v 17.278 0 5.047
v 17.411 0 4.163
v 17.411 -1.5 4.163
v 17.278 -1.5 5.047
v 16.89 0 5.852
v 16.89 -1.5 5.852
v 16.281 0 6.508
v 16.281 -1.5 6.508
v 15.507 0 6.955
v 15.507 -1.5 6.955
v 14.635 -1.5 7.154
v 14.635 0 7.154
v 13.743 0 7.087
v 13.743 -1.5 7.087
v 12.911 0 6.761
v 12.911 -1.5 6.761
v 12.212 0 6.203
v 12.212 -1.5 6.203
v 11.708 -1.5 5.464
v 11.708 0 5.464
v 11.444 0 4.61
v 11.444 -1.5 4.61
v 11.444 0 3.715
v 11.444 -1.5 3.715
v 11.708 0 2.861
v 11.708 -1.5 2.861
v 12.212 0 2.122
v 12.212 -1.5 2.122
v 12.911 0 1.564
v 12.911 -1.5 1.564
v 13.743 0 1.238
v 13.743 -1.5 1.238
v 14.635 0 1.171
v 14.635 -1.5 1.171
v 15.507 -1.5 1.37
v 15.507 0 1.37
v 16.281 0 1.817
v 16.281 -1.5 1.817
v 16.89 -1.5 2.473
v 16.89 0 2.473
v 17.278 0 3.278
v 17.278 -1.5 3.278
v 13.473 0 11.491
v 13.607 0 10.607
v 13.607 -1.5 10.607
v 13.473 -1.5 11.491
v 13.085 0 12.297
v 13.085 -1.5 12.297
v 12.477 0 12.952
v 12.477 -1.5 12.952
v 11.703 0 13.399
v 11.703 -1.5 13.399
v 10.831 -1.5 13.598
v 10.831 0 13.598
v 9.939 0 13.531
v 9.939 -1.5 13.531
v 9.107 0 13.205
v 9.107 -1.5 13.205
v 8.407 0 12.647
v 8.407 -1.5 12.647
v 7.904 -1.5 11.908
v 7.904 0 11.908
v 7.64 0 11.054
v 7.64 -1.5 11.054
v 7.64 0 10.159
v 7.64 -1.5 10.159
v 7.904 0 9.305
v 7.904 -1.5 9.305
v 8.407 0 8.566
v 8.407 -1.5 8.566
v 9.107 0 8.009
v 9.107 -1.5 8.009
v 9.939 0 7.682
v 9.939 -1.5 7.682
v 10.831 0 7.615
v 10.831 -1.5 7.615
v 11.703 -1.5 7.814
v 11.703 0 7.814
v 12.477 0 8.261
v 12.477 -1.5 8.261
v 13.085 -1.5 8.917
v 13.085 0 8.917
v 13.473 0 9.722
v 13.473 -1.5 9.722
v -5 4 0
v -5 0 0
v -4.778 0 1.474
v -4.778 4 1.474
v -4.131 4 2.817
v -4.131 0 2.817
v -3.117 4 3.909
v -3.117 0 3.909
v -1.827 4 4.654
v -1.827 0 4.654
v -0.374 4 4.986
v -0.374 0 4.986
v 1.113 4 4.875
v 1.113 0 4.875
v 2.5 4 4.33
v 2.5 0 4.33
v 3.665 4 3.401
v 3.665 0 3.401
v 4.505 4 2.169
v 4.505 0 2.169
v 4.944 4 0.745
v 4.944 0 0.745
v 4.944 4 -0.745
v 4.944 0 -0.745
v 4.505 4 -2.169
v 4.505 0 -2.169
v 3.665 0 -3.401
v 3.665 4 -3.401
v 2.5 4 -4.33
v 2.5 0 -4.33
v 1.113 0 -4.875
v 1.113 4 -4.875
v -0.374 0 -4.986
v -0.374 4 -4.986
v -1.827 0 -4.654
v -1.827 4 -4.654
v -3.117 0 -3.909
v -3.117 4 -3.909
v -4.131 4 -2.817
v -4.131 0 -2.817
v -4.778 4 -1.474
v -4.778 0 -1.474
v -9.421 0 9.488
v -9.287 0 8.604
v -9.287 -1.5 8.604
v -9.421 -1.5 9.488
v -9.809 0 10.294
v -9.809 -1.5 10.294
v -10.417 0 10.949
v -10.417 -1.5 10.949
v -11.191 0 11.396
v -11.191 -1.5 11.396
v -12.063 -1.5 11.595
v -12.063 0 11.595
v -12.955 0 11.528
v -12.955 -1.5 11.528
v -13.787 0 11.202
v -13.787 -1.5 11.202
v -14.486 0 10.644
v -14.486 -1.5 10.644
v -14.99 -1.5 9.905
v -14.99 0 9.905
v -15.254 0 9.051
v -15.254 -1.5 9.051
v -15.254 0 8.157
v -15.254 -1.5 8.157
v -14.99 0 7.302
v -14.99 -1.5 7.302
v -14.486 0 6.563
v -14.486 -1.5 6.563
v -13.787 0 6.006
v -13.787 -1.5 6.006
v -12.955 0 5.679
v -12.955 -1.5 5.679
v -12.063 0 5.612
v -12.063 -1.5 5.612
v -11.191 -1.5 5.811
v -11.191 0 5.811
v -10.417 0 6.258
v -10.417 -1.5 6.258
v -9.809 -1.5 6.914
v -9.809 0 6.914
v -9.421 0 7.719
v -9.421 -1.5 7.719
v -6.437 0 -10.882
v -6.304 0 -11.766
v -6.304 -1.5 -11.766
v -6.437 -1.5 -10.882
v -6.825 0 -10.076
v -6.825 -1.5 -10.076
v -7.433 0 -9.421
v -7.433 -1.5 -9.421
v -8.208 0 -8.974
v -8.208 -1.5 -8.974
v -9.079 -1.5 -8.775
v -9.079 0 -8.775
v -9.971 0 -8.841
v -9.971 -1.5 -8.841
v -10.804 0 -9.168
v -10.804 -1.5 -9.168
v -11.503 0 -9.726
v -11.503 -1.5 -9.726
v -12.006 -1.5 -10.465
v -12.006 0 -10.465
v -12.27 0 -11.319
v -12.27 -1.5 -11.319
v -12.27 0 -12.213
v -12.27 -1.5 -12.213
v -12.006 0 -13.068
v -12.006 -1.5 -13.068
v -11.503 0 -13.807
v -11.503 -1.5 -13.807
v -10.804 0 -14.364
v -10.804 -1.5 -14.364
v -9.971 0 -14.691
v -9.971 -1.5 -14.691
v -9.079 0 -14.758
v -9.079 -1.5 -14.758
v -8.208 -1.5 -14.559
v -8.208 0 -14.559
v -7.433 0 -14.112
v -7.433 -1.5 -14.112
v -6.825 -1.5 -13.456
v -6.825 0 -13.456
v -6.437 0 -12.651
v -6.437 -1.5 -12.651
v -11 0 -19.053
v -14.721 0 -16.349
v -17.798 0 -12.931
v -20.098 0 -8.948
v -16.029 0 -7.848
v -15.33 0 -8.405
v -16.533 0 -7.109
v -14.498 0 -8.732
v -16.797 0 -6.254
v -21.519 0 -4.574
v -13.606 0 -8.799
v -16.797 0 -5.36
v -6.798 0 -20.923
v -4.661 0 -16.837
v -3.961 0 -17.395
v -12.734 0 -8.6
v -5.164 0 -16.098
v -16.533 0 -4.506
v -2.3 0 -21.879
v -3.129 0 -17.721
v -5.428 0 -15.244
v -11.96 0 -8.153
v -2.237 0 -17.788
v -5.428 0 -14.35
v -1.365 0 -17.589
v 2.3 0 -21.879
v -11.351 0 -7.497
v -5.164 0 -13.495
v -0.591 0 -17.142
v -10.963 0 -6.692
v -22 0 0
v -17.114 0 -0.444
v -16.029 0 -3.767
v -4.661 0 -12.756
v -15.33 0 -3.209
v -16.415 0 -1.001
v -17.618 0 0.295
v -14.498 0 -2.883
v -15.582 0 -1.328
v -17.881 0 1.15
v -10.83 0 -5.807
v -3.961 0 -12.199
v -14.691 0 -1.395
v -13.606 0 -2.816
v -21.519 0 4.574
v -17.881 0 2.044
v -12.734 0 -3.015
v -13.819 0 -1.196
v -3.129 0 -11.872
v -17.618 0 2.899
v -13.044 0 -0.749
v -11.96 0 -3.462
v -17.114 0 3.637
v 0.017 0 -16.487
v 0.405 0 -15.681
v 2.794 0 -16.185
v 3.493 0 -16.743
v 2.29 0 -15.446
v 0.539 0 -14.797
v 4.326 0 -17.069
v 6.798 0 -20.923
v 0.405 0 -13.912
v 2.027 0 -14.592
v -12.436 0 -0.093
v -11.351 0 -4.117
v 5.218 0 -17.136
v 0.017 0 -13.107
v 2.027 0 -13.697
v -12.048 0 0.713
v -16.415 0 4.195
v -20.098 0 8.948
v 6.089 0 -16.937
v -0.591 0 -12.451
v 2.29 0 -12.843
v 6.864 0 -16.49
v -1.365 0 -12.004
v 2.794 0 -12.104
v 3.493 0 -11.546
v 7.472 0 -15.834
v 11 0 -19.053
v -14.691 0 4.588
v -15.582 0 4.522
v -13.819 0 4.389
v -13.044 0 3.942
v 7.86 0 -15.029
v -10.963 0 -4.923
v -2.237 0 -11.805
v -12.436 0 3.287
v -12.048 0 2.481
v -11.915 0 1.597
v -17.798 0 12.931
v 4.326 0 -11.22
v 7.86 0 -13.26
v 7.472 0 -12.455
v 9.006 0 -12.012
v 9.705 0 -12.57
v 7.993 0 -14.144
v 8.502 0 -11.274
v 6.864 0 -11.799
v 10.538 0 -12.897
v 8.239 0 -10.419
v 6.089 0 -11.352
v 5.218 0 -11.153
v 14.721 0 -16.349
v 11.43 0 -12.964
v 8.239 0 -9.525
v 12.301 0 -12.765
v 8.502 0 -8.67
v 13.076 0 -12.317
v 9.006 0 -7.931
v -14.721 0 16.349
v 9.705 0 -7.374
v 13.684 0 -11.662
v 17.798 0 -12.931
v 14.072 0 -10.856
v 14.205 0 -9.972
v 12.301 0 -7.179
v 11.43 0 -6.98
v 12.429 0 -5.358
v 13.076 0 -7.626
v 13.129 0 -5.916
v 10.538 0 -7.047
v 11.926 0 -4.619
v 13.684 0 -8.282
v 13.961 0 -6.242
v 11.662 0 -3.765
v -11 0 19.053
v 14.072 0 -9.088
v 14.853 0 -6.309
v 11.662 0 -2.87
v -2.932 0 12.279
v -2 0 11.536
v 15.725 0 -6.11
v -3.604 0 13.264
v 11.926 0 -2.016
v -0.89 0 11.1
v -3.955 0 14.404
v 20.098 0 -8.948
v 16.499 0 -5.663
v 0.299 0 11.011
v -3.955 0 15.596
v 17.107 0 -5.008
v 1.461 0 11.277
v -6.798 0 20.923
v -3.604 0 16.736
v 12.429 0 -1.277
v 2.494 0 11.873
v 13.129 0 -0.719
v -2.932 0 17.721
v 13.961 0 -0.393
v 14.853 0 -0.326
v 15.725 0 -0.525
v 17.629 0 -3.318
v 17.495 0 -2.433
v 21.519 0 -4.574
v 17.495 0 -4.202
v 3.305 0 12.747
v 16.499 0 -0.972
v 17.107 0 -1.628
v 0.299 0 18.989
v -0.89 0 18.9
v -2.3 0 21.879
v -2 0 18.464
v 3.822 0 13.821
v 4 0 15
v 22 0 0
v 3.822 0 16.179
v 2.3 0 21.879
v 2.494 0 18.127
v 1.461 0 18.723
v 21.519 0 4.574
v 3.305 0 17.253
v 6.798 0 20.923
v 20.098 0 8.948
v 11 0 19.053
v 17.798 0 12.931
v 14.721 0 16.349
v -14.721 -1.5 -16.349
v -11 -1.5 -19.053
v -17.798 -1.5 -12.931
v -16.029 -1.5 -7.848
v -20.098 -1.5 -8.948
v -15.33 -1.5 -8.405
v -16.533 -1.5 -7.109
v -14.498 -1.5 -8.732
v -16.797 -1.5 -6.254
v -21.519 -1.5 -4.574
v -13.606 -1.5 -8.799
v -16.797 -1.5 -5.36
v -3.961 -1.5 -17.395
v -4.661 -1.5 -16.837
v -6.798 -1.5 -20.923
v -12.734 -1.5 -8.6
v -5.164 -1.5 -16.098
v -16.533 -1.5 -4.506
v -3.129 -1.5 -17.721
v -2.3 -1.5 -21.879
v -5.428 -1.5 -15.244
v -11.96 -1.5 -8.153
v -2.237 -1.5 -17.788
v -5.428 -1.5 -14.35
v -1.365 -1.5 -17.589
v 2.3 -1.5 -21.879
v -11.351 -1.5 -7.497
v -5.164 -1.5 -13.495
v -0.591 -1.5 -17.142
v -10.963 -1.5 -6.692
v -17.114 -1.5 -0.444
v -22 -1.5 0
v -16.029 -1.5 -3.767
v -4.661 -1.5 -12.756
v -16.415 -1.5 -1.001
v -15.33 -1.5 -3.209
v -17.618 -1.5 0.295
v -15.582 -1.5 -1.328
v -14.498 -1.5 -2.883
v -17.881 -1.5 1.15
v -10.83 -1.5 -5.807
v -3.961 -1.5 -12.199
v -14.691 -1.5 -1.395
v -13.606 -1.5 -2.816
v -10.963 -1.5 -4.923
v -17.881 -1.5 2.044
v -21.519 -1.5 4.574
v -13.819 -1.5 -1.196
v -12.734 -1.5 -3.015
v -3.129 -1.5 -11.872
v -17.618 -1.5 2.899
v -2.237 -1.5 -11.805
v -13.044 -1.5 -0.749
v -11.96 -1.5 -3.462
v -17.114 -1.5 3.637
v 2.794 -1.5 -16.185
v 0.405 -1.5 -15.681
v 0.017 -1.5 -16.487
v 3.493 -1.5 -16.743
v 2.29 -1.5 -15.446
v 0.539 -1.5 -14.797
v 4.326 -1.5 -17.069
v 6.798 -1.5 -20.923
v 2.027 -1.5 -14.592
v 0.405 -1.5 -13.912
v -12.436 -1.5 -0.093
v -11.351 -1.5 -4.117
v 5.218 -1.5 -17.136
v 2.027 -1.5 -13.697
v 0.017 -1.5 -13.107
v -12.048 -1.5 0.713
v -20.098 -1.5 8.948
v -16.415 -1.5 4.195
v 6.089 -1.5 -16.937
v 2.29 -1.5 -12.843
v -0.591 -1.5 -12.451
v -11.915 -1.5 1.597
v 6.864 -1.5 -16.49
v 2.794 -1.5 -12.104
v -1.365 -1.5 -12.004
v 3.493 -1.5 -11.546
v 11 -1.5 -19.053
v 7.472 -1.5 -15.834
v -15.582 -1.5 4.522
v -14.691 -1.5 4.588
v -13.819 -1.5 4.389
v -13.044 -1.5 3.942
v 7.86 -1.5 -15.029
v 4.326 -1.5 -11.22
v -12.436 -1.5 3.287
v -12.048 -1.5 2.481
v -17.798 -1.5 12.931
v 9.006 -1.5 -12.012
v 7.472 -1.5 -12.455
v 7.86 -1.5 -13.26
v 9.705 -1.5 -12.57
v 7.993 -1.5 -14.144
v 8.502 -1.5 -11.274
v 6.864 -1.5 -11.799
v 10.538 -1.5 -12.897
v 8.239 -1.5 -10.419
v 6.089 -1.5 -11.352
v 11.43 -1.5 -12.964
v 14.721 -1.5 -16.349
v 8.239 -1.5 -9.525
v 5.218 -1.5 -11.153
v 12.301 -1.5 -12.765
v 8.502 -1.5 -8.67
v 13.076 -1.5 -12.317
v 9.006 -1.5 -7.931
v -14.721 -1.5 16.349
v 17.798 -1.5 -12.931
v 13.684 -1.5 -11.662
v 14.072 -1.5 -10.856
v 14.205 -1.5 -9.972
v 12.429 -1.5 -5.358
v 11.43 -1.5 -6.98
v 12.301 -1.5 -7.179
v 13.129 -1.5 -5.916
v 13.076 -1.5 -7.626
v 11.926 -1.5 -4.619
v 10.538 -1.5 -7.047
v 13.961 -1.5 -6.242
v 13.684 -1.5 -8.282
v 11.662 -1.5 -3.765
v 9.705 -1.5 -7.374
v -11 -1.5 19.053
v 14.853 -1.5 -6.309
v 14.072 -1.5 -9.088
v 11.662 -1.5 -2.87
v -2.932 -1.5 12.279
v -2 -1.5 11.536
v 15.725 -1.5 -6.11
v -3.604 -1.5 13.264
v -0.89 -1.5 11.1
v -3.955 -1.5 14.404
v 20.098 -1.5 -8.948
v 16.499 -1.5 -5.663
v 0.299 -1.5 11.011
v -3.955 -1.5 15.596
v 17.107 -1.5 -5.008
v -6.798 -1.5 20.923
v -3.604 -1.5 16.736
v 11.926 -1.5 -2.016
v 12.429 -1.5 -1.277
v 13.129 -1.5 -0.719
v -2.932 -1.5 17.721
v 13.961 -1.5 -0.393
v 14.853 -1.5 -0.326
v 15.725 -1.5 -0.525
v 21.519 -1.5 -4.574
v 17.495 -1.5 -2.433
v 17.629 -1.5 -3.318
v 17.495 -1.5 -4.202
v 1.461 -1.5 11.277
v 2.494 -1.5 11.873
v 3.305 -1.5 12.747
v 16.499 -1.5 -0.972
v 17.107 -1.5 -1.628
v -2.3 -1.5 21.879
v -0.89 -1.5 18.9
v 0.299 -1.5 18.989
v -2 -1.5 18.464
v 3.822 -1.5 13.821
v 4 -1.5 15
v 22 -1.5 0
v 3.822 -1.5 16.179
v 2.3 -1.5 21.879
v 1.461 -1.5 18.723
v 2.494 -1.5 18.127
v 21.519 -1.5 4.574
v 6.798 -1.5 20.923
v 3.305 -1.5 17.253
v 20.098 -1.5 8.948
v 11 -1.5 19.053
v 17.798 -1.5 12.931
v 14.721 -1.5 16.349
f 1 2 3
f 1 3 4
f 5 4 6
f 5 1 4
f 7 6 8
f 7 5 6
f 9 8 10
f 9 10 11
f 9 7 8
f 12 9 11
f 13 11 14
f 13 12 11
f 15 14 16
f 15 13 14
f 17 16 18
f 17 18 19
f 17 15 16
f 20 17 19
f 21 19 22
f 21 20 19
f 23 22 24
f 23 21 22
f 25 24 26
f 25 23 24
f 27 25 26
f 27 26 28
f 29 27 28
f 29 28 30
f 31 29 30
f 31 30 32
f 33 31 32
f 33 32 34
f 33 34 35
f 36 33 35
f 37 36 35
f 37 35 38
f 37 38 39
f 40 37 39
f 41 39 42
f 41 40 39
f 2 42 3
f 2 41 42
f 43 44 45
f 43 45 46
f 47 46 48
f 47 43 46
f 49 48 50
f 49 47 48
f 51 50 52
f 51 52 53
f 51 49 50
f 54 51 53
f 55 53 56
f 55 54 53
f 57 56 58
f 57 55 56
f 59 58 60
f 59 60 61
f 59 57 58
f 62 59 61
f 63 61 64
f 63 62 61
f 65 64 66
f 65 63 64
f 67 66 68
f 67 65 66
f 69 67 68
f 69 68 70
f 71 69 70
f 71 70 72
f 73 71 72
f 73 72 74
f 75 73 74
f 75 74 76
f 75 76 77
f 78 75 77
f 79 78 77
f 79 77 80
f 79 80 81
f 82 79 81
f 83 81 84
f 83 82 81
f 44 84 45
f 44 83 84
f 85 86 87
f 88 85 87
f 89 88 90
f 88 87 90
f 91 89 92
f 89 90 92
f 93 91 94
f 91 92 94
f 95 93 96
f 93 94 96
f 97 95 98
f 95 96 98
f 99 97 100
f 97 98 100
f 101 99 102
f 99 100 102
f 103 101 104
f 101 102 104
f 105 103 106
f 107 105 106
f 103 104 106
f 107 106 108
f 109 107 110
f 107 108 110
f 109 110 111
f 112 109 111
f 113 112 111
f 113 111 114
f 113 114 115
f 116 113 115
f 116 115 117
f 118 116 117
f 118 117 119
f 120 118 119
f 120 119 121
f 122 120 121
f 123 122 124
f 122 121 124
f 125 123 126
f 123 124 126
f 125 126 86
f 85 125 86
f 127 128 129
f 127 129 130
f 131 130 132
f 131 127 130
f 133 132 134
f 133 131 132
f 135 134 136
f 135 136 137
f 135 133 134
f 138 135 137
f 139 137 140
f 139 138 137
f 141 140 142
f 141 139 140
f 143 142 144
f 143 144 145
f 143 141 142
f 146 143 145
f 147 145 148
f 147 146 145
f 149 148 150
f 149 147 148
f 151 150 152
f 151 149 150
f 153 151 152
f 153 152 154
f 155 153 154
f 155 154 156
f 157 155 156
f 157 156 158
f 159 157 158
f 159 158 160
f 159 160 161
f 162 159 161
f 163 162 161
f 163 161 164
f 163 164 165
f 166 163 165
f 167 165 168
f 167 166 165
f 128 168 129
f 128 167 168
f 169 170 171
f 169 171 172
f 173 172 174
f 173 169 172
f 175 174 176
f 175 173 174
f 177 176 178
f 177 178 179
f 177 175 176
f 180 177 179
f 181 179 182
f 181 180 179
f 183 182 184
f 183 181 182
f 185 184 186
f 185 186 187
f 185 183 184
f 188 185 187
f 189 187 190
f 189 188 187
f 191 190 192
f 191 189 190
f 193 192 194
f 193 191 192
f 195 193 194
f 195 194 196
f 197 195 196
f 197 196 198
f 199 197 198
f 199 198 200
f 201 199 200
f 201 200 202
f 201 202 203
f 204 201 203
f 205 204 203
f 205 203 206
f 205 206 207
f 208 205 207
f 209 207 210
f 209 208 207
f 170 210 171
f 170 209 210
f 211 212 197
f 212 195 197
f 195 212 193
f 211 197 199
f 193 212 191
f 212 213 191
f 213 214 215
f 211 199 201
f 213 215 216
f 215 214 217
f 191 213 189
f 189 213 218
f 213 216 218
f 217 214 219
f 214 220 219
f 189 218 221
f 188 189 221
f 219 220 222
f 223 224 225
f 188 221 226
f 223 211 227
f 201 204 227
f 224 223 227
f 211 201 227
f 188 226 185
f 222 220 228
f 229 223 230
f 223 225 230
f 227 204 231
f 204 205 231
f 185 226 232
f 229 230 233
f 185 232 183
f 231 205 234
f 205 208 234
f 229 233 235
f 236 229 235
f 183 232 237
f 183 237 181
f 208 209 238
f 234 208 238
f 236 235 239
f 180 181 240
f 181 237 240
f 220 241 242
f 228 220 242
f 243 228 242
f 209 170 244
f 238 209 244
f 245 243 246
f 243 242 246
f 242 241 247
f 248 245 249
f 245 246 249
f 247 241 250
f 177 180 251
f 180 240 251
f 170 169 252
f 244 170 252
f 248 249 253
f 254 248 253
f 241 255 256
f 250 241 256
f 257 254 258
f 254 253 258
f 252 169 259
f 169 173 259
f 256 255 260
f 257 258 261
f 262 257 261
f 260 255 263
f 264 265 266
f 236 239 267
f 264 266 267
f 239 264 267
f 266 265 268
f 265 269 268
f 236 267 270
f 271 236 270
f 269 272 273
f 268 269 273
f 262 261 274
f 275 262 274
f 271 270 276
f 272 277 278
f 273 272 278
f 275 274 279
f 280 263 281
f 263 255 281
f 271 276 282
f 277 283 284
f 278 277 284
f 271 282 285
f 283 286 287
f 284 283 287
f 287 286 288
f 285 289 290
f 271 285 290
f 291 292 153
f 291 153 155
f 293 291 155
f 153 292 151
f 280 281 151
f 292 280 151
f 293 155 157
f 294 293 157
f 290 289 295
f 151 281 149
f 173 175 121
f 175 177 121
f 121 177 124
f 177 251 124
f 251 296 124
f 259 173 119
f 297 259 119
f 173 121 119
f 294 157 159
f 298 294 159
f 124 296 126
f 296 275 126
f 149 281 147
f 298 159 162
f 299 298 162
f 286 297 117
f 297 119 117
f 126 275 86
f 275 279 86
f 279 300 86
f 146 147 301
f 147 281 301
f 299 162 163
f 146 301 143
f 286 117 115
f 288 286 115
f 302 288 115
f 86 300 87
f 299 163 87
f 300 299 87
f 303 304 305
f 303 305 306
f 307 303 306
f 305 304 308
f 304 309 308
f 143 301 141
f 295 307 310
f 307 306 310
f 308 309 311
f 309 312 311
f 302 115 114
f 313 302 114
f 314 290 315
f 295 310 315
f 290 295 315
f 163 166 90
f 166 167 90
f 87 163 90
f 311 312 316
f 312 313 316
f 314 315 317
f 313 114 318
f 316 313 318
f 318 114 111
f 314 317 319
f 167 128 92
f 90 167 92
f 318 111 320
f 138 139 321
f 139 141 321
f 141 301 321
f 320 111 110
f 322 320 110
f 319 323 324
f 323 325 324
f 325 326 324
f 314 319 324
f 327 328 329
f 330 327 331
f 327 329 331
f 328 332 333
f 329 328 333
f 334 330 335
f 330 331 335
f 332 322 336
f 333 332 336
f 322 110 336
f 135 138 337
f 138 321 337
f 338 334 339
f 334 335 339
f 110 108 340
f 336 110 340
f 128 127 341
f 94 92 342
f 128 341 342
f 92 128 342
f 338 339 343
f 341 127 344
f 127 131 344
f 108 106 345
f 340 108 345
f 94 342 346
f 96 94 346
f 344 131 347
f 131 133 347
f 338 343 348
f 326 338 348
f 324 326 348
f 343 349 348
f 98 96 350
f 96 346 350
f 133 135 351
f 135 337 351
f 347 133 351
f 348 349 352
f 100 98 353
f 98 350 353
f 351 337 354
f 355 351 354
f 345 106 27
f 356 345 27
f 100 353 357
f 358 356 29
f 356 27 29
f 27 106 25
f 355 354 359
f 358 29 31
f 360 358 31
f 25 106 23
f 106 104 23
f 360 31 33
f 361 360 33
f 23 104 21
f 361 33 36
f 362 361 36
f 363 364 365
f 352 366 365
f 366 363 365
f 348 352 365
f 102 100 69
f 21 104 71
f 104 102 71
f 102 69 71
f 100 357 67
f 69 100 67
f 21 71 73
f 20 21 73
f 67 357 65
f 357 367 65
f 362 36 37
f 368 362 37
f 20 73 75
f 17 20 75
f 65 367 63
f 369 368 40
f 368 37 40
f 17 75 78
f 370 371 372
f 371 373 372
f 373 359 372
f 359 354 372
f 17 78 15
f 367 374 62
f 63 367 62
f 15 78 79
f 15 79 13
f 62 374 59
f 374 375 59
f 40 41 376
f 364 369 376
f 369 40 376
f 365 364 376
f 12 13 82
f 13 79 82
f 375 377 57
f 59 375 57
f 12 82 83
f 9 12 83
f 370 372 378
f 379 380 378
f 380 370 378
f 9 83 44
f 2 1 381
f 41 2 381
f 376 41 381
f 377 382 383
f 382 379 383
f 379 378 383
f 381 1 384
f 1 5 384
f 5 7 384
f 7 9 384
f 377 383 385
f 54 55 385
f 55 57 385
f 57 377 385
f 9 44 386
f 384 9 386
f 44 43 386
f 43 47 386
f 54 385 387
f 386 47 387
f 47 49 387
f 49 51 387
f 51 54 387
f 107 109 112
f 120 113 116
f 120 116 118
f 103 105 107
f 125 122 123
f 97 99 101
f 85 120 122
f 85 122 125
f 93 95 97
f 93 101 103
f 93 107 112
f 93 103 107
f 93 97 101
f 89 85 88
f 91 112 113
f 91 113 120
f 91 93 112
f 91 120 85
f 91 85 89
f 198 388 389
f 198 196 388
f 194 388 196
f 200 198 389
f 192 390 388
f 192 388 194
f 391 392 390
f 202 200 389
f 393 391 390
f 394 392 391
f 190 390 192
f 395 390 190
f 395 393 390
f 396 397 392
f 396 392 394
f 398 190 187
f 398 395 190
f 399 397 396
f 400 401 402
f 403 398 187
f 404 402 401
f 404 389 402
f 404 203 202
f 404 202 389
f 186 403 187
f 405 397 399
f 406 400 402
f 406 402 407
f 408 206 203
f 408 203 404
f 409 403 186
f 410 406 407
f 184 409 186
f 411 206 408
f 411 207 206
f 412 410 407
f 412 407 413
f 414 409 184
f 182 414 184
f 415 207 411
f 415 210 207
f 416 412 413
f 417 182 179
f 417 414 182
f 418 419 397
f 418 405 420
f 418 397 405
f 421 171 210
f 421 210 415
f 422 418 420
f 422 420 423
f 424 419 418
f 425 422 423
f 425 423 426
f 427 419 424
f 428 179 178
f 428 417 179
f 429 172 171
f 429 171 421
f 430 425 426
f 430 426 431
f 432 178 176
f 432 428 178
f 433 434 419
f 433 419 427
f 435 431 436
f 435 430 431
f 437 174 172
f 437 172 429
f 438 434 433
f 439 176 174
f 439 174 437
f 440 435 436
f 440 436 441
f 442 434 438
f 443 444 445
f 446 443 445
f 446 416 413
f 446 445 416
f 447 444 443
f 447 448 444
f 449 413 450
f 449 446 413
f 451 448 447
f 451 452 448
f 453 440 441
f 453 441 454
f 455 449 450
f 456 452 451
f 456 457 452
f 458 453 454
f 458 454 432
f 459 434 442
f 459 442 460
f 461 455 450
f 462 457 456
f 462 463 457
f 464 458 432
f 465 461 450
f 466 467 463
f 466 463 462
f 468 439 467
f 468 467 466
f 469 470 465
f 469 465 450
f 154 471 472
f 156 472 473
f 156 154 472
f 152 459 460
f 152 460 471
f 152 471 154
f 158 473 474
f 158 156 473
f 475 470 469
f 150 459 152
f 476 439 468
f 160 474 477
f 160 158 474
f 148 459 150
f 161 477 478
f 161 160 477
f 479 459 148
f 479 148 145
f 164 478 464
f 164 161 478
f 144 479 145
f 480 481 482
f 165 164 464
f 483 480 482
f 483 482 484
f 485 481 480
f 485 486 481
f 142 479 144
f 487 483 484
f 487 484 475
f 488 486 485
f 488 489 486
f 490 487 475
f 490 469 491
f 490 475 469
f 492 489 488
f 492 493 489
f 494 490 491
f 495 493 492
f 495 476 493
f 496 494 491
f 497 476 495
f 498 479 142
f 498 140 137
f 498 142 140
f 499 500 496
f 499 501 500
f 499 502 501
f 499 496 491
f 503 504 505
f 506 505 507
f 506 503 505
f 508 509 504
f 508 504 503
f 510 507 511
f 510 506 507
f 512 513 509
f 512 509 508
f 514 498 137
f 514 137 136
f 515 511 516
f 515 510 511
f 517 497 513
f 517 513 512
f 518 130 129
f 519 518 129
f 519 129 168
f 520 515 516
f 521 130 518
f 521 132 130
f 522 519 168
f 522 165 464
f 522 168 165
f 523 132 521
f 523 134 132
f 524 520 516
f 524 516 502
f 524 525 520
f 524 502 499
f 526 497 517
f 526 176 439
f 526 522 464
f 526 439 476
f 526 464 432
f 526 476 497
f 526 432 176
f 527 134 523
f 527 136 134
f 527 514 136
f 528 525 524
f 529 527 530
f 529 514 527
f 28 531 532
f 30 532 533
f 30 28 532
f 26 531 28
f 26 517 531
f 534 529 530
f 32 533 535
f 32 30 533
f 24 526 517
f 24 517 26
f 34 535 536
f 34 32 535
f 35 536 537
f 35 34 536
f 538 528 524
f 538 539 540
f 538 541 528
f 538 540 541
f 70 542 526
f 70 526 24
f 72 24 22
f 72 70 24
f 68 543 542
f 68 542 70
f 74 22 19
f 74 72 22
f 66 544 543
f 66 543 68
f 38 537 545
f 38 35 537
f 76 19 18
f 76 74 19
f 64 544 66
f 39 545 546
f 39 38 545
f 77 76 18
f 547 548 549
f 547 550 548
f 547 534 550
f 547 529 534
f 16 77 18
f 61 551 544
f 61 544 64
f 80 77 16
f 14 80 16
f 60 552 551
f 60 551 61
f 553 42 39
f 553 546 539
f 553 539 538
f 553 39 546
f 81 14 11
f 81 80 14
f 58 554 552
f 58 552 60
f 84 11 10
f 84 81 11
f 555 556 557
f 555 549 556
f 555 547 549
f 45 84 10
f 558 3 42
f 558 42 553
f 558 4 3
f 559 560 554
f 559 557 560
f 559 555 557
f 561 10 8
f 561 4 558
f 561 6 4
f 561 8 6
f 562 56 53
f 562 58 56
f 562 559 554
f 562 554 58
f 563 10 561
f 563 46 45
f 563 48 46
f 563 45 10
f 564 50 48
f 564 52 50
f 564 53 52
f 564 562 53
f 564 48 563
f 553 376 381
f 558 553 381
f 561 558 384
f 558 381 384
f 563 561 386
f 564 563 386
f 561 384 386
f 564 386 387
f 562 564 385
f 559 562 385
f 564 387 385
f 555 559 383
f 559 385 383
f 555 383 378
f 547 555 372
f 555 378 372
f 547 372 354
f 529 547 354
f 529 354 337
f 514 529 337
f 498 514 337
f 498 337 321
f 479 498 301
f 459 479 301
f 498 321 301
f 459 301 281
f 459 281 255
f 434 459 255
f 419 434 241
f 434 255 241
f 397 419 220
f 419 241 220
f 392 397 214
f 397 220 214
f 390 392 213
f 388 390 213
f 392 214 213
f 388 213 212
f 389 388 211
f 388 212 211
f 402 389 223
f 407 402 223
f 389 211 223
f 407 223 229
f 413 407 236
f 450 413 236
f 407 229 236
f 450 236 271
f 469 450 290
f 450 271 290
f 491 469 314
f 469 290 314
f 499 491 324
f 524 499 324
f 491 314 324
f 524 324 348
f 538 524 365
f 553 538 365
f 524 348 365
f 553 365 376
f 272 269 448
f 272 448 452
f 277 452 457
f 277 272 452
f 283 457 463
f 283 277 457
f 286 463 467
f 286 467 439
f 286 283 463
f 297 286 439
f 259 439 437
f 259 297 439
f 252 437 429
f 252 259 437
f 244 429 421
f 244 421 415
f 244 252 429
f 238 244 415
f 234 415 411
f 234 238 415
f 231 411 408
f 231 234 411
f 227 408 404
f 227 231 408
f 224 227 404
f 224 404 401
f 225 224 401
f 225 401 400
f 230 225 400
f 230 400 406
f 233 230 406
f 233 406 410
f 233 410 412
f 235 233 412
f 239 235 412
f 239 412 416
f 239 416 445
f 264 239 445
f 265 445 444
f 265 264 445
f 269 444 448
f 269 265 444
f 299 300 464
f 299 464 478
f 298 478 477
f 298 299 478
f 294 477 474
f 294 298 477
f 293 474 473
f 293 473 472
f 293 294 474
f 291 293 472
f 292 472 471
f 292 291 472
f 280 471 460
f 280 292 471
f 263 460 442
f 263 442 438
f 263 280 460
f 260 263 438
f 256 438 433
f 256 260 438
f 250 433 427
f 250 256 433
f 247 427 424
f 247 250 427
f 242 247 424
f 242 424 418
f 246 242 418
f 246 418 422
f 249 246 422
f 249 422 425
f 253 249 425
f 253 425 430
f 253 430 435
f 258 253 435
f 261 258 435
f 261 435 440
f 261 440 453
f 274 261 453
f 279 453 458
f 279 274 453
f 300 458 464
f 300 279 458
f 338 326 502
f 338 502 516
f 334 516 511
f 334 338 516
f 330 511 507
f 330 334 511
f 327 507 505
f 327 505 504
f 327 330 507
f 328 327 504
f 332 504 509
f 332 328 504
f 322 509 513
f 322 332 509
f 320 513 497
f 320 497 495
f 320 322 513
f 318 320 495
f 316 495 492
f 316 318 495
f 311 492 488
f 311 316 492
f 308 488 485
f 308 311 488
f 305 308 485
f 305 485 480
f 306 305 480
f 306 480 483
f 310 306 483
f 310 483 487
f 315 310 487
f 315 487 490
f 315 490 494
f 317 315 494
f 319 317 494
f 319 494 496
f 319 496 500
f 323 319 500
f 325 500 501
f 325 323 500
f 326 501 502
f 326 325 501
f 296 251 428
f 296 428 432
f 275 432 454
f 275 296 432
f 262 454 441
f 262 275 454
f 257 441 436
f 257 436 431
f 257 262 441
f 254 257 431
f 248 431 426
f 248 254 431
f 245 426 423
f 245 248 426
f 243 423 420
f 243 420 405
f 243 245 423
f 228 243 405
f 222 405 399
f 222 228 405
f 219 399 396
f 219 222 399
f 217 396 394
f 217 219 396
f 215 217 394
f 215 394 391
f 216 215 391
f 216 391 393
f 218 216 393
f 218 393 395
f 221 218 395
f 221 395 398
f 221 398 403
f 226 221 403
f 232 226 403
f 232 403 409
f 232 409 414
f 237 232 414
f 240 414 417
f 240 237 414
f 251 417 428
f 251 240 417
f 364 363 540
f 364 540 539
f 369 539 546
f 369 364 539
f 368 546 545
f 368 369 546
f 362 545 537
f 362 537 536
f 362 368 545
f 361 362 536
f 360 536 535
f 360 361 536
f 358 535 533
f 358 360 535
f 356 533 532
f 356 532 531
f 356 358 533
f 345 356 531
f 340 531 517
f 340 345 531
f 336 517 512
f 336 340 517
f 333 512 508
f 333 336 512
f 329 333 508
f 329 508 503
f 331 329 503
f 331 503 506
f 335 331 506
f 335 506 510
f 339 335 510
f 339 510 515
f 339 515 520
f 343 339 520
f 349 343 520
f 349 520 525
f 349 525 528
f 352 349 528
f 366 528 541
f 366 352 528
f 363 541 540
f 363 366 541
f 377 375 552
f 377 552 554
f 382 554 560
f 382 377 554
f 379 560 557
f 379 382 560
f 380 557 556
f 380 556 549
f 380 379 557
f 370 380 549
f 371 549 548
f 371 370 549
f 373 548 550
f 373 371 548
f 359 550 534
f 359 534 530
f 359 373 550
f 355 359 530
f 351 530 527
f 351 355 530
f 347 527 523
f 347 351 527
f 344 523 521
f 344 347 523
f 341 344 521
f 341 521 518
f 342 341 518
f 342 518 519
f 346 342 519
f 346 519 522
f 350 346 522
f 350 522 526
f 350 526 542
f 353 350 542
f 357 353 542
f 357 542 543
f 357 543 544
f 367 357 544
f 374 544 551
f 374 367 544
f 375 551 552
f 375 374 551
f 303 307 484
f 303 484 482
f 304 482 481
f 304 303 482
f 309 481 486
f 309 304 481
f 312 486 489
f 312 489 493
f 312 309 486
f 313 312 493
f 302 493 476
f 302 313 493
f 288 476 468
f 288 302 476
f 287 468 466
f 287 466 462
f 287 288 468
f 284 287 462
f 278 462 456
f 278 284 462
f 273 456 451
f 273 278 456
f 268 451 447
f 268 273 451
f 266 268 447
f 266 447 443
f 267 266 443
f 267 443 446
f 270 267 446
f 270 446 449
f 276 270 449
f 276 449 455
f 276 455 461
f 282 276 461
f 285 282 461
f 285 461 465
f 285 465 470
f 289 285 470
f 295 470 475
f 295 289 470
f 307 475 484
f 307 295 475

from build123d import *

# Parameters (mm, degrees)
F0_R     = 22
F0_R_2   = 3
F0_R_3   = 4
F1_DEPTH = 1.5
F2_R     = 5
F3_DEPTH = 4


with BuildPart() as f1:
    # F0 (on Front) → F1 (new body)
    with BuildSketch(Plane.XZ):
        Circle(F0_R)
        with Locations((-9.303532, -11.766235)):
            Circle(F0_R_2, mode=Mode.SUBTRACT)
        with Locations((-2.461368, -14.796678)):
            Circle(F0_R_2, mode=Mode.SUBTRACT)
        with Locations((-13.830201, -5.80737)):
            Circle(F0_R_2, mode=Mode.SUBTRACT)
        with Locations((4.99339, -14.144471)):
            Circle(F0_R_2, mode=Mode.SUBTRACT)
        with Locations((11.205376, -9.971938)):
            Circle(F0_R_2, mode=Mode.SUBTRACT)
        with Locations((14.628528, -3.317554)):
            Circle(F0_R_2, mode=Mode.SUBTRACT)
        with Locations((-14.91476, 1.596853)):
            Circle(F0_R_2, mode=Mode.SUBTRACT)
        with Locations((-12.287281, 8.603647)):
            Circle(F0_R_2, mode=Mode.SUBTRACT)
        with Locations((10.606602, 10.606602)):
            Circle(F0_R_2, mode=Mode.SUBTRACT)
        with Locations((14.41088, 4.162515)):
            Circle(F0_R_2, mode=Mode.SUBTRACT)
        with Locations((0, 15)):
            Circle(F0_R_3, mode=Mode.SUBTRACT)
    extrude(amount=F1_DEPTH)

    # F2 (on face) → F3 (join)
    with BuildSketch(Plane(origin=(0, 0, 0), x_dir=(-1, 0, 0), z_dir=(0, 1, 0))):
        Circle(F2_R)
    extrude(amount=F3_DEPTH)


solid = f1.part
